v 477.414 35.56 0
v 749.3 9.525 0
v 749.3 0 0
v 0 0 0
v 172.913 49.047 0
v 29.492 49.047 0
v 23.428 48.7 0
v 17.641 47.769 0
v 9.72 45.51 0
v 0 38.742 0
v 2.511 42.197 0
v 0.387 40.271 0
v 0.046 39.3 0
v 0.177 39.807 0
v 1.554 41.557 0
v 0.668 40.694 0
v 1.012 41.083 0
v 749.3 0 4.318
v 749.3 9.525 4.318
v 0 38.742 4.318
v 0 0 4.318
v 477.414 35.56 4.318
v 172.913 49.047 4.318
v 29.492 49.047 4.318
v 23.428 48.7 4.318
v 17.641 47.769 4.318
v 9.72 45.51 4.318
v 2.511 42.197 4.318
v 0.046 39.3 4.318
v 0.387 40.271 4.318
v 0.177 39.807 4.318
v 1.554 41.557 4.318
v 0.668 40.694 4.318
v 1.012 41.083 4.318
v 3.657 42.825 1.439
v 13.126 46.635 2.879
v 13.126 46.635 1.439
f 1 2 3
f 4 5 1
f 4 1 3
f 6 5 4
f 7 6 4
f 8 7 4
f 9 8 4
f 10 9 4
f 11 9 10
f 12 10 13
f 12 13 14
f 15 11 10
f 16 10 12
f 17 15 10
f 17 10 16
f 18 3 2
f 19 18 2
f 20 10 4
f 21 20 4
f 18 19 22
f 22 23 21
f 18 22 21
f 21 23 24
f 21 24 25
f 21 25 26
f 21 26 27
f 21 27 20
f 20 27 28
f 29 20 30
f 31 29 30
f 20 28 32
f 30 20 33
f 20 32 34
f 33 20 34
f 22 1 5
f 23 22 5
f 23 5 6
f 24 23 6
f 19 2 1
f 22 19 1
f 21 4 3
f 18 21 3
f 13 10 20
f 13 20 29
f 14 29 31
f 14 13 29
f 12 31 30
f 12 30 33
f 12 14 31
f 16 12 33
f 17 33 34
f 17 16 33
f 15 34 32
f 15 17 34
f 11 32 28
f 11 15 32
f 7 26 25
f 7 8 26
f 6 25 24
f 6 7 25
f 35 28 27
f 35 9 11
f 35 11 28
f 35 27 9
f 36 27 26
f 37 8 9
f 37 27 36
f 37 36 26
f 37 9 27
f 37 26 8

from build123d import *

# Parameters (mm, degrees)
F1_DEPTH = 4.318


with BuildPart() as f1:
    # F0 (on Top) → F1 (new body)
    with BuildSketch(Plane.XY):
        with BuildLine():
            add(Edge.make_bspline(
                [(0, 38.7419006444), (0, 40.780224347), (4.0504073247, 43.2264357913), (13.3197663427, 47.2353910075), (23.679706238, 49.0470707989), (29.4917598367, 49.0470707989)],
                knots=[0, 0, 0, 0, 0.243800261, 0.5764746481, 1, 1, 1, 1], degree=3))
            Line((0, 38.7419006444), (0, 0))
            Line((0, 0), (749.3, 0))
            Line((749.3, 0), (749.3, 9.525))
            Line((749.3, 9.525), (477.4143925697, 35.56))
            Line((477.4143925697, 35.56), (172.9129329324, 49.0470707989))
            Line((172.9129329324, 49.0470707989), (29.4917598367, 49.0470707989))
        make_face()
    extrude(amount=F1_DEPTH)


solid = f1.part
